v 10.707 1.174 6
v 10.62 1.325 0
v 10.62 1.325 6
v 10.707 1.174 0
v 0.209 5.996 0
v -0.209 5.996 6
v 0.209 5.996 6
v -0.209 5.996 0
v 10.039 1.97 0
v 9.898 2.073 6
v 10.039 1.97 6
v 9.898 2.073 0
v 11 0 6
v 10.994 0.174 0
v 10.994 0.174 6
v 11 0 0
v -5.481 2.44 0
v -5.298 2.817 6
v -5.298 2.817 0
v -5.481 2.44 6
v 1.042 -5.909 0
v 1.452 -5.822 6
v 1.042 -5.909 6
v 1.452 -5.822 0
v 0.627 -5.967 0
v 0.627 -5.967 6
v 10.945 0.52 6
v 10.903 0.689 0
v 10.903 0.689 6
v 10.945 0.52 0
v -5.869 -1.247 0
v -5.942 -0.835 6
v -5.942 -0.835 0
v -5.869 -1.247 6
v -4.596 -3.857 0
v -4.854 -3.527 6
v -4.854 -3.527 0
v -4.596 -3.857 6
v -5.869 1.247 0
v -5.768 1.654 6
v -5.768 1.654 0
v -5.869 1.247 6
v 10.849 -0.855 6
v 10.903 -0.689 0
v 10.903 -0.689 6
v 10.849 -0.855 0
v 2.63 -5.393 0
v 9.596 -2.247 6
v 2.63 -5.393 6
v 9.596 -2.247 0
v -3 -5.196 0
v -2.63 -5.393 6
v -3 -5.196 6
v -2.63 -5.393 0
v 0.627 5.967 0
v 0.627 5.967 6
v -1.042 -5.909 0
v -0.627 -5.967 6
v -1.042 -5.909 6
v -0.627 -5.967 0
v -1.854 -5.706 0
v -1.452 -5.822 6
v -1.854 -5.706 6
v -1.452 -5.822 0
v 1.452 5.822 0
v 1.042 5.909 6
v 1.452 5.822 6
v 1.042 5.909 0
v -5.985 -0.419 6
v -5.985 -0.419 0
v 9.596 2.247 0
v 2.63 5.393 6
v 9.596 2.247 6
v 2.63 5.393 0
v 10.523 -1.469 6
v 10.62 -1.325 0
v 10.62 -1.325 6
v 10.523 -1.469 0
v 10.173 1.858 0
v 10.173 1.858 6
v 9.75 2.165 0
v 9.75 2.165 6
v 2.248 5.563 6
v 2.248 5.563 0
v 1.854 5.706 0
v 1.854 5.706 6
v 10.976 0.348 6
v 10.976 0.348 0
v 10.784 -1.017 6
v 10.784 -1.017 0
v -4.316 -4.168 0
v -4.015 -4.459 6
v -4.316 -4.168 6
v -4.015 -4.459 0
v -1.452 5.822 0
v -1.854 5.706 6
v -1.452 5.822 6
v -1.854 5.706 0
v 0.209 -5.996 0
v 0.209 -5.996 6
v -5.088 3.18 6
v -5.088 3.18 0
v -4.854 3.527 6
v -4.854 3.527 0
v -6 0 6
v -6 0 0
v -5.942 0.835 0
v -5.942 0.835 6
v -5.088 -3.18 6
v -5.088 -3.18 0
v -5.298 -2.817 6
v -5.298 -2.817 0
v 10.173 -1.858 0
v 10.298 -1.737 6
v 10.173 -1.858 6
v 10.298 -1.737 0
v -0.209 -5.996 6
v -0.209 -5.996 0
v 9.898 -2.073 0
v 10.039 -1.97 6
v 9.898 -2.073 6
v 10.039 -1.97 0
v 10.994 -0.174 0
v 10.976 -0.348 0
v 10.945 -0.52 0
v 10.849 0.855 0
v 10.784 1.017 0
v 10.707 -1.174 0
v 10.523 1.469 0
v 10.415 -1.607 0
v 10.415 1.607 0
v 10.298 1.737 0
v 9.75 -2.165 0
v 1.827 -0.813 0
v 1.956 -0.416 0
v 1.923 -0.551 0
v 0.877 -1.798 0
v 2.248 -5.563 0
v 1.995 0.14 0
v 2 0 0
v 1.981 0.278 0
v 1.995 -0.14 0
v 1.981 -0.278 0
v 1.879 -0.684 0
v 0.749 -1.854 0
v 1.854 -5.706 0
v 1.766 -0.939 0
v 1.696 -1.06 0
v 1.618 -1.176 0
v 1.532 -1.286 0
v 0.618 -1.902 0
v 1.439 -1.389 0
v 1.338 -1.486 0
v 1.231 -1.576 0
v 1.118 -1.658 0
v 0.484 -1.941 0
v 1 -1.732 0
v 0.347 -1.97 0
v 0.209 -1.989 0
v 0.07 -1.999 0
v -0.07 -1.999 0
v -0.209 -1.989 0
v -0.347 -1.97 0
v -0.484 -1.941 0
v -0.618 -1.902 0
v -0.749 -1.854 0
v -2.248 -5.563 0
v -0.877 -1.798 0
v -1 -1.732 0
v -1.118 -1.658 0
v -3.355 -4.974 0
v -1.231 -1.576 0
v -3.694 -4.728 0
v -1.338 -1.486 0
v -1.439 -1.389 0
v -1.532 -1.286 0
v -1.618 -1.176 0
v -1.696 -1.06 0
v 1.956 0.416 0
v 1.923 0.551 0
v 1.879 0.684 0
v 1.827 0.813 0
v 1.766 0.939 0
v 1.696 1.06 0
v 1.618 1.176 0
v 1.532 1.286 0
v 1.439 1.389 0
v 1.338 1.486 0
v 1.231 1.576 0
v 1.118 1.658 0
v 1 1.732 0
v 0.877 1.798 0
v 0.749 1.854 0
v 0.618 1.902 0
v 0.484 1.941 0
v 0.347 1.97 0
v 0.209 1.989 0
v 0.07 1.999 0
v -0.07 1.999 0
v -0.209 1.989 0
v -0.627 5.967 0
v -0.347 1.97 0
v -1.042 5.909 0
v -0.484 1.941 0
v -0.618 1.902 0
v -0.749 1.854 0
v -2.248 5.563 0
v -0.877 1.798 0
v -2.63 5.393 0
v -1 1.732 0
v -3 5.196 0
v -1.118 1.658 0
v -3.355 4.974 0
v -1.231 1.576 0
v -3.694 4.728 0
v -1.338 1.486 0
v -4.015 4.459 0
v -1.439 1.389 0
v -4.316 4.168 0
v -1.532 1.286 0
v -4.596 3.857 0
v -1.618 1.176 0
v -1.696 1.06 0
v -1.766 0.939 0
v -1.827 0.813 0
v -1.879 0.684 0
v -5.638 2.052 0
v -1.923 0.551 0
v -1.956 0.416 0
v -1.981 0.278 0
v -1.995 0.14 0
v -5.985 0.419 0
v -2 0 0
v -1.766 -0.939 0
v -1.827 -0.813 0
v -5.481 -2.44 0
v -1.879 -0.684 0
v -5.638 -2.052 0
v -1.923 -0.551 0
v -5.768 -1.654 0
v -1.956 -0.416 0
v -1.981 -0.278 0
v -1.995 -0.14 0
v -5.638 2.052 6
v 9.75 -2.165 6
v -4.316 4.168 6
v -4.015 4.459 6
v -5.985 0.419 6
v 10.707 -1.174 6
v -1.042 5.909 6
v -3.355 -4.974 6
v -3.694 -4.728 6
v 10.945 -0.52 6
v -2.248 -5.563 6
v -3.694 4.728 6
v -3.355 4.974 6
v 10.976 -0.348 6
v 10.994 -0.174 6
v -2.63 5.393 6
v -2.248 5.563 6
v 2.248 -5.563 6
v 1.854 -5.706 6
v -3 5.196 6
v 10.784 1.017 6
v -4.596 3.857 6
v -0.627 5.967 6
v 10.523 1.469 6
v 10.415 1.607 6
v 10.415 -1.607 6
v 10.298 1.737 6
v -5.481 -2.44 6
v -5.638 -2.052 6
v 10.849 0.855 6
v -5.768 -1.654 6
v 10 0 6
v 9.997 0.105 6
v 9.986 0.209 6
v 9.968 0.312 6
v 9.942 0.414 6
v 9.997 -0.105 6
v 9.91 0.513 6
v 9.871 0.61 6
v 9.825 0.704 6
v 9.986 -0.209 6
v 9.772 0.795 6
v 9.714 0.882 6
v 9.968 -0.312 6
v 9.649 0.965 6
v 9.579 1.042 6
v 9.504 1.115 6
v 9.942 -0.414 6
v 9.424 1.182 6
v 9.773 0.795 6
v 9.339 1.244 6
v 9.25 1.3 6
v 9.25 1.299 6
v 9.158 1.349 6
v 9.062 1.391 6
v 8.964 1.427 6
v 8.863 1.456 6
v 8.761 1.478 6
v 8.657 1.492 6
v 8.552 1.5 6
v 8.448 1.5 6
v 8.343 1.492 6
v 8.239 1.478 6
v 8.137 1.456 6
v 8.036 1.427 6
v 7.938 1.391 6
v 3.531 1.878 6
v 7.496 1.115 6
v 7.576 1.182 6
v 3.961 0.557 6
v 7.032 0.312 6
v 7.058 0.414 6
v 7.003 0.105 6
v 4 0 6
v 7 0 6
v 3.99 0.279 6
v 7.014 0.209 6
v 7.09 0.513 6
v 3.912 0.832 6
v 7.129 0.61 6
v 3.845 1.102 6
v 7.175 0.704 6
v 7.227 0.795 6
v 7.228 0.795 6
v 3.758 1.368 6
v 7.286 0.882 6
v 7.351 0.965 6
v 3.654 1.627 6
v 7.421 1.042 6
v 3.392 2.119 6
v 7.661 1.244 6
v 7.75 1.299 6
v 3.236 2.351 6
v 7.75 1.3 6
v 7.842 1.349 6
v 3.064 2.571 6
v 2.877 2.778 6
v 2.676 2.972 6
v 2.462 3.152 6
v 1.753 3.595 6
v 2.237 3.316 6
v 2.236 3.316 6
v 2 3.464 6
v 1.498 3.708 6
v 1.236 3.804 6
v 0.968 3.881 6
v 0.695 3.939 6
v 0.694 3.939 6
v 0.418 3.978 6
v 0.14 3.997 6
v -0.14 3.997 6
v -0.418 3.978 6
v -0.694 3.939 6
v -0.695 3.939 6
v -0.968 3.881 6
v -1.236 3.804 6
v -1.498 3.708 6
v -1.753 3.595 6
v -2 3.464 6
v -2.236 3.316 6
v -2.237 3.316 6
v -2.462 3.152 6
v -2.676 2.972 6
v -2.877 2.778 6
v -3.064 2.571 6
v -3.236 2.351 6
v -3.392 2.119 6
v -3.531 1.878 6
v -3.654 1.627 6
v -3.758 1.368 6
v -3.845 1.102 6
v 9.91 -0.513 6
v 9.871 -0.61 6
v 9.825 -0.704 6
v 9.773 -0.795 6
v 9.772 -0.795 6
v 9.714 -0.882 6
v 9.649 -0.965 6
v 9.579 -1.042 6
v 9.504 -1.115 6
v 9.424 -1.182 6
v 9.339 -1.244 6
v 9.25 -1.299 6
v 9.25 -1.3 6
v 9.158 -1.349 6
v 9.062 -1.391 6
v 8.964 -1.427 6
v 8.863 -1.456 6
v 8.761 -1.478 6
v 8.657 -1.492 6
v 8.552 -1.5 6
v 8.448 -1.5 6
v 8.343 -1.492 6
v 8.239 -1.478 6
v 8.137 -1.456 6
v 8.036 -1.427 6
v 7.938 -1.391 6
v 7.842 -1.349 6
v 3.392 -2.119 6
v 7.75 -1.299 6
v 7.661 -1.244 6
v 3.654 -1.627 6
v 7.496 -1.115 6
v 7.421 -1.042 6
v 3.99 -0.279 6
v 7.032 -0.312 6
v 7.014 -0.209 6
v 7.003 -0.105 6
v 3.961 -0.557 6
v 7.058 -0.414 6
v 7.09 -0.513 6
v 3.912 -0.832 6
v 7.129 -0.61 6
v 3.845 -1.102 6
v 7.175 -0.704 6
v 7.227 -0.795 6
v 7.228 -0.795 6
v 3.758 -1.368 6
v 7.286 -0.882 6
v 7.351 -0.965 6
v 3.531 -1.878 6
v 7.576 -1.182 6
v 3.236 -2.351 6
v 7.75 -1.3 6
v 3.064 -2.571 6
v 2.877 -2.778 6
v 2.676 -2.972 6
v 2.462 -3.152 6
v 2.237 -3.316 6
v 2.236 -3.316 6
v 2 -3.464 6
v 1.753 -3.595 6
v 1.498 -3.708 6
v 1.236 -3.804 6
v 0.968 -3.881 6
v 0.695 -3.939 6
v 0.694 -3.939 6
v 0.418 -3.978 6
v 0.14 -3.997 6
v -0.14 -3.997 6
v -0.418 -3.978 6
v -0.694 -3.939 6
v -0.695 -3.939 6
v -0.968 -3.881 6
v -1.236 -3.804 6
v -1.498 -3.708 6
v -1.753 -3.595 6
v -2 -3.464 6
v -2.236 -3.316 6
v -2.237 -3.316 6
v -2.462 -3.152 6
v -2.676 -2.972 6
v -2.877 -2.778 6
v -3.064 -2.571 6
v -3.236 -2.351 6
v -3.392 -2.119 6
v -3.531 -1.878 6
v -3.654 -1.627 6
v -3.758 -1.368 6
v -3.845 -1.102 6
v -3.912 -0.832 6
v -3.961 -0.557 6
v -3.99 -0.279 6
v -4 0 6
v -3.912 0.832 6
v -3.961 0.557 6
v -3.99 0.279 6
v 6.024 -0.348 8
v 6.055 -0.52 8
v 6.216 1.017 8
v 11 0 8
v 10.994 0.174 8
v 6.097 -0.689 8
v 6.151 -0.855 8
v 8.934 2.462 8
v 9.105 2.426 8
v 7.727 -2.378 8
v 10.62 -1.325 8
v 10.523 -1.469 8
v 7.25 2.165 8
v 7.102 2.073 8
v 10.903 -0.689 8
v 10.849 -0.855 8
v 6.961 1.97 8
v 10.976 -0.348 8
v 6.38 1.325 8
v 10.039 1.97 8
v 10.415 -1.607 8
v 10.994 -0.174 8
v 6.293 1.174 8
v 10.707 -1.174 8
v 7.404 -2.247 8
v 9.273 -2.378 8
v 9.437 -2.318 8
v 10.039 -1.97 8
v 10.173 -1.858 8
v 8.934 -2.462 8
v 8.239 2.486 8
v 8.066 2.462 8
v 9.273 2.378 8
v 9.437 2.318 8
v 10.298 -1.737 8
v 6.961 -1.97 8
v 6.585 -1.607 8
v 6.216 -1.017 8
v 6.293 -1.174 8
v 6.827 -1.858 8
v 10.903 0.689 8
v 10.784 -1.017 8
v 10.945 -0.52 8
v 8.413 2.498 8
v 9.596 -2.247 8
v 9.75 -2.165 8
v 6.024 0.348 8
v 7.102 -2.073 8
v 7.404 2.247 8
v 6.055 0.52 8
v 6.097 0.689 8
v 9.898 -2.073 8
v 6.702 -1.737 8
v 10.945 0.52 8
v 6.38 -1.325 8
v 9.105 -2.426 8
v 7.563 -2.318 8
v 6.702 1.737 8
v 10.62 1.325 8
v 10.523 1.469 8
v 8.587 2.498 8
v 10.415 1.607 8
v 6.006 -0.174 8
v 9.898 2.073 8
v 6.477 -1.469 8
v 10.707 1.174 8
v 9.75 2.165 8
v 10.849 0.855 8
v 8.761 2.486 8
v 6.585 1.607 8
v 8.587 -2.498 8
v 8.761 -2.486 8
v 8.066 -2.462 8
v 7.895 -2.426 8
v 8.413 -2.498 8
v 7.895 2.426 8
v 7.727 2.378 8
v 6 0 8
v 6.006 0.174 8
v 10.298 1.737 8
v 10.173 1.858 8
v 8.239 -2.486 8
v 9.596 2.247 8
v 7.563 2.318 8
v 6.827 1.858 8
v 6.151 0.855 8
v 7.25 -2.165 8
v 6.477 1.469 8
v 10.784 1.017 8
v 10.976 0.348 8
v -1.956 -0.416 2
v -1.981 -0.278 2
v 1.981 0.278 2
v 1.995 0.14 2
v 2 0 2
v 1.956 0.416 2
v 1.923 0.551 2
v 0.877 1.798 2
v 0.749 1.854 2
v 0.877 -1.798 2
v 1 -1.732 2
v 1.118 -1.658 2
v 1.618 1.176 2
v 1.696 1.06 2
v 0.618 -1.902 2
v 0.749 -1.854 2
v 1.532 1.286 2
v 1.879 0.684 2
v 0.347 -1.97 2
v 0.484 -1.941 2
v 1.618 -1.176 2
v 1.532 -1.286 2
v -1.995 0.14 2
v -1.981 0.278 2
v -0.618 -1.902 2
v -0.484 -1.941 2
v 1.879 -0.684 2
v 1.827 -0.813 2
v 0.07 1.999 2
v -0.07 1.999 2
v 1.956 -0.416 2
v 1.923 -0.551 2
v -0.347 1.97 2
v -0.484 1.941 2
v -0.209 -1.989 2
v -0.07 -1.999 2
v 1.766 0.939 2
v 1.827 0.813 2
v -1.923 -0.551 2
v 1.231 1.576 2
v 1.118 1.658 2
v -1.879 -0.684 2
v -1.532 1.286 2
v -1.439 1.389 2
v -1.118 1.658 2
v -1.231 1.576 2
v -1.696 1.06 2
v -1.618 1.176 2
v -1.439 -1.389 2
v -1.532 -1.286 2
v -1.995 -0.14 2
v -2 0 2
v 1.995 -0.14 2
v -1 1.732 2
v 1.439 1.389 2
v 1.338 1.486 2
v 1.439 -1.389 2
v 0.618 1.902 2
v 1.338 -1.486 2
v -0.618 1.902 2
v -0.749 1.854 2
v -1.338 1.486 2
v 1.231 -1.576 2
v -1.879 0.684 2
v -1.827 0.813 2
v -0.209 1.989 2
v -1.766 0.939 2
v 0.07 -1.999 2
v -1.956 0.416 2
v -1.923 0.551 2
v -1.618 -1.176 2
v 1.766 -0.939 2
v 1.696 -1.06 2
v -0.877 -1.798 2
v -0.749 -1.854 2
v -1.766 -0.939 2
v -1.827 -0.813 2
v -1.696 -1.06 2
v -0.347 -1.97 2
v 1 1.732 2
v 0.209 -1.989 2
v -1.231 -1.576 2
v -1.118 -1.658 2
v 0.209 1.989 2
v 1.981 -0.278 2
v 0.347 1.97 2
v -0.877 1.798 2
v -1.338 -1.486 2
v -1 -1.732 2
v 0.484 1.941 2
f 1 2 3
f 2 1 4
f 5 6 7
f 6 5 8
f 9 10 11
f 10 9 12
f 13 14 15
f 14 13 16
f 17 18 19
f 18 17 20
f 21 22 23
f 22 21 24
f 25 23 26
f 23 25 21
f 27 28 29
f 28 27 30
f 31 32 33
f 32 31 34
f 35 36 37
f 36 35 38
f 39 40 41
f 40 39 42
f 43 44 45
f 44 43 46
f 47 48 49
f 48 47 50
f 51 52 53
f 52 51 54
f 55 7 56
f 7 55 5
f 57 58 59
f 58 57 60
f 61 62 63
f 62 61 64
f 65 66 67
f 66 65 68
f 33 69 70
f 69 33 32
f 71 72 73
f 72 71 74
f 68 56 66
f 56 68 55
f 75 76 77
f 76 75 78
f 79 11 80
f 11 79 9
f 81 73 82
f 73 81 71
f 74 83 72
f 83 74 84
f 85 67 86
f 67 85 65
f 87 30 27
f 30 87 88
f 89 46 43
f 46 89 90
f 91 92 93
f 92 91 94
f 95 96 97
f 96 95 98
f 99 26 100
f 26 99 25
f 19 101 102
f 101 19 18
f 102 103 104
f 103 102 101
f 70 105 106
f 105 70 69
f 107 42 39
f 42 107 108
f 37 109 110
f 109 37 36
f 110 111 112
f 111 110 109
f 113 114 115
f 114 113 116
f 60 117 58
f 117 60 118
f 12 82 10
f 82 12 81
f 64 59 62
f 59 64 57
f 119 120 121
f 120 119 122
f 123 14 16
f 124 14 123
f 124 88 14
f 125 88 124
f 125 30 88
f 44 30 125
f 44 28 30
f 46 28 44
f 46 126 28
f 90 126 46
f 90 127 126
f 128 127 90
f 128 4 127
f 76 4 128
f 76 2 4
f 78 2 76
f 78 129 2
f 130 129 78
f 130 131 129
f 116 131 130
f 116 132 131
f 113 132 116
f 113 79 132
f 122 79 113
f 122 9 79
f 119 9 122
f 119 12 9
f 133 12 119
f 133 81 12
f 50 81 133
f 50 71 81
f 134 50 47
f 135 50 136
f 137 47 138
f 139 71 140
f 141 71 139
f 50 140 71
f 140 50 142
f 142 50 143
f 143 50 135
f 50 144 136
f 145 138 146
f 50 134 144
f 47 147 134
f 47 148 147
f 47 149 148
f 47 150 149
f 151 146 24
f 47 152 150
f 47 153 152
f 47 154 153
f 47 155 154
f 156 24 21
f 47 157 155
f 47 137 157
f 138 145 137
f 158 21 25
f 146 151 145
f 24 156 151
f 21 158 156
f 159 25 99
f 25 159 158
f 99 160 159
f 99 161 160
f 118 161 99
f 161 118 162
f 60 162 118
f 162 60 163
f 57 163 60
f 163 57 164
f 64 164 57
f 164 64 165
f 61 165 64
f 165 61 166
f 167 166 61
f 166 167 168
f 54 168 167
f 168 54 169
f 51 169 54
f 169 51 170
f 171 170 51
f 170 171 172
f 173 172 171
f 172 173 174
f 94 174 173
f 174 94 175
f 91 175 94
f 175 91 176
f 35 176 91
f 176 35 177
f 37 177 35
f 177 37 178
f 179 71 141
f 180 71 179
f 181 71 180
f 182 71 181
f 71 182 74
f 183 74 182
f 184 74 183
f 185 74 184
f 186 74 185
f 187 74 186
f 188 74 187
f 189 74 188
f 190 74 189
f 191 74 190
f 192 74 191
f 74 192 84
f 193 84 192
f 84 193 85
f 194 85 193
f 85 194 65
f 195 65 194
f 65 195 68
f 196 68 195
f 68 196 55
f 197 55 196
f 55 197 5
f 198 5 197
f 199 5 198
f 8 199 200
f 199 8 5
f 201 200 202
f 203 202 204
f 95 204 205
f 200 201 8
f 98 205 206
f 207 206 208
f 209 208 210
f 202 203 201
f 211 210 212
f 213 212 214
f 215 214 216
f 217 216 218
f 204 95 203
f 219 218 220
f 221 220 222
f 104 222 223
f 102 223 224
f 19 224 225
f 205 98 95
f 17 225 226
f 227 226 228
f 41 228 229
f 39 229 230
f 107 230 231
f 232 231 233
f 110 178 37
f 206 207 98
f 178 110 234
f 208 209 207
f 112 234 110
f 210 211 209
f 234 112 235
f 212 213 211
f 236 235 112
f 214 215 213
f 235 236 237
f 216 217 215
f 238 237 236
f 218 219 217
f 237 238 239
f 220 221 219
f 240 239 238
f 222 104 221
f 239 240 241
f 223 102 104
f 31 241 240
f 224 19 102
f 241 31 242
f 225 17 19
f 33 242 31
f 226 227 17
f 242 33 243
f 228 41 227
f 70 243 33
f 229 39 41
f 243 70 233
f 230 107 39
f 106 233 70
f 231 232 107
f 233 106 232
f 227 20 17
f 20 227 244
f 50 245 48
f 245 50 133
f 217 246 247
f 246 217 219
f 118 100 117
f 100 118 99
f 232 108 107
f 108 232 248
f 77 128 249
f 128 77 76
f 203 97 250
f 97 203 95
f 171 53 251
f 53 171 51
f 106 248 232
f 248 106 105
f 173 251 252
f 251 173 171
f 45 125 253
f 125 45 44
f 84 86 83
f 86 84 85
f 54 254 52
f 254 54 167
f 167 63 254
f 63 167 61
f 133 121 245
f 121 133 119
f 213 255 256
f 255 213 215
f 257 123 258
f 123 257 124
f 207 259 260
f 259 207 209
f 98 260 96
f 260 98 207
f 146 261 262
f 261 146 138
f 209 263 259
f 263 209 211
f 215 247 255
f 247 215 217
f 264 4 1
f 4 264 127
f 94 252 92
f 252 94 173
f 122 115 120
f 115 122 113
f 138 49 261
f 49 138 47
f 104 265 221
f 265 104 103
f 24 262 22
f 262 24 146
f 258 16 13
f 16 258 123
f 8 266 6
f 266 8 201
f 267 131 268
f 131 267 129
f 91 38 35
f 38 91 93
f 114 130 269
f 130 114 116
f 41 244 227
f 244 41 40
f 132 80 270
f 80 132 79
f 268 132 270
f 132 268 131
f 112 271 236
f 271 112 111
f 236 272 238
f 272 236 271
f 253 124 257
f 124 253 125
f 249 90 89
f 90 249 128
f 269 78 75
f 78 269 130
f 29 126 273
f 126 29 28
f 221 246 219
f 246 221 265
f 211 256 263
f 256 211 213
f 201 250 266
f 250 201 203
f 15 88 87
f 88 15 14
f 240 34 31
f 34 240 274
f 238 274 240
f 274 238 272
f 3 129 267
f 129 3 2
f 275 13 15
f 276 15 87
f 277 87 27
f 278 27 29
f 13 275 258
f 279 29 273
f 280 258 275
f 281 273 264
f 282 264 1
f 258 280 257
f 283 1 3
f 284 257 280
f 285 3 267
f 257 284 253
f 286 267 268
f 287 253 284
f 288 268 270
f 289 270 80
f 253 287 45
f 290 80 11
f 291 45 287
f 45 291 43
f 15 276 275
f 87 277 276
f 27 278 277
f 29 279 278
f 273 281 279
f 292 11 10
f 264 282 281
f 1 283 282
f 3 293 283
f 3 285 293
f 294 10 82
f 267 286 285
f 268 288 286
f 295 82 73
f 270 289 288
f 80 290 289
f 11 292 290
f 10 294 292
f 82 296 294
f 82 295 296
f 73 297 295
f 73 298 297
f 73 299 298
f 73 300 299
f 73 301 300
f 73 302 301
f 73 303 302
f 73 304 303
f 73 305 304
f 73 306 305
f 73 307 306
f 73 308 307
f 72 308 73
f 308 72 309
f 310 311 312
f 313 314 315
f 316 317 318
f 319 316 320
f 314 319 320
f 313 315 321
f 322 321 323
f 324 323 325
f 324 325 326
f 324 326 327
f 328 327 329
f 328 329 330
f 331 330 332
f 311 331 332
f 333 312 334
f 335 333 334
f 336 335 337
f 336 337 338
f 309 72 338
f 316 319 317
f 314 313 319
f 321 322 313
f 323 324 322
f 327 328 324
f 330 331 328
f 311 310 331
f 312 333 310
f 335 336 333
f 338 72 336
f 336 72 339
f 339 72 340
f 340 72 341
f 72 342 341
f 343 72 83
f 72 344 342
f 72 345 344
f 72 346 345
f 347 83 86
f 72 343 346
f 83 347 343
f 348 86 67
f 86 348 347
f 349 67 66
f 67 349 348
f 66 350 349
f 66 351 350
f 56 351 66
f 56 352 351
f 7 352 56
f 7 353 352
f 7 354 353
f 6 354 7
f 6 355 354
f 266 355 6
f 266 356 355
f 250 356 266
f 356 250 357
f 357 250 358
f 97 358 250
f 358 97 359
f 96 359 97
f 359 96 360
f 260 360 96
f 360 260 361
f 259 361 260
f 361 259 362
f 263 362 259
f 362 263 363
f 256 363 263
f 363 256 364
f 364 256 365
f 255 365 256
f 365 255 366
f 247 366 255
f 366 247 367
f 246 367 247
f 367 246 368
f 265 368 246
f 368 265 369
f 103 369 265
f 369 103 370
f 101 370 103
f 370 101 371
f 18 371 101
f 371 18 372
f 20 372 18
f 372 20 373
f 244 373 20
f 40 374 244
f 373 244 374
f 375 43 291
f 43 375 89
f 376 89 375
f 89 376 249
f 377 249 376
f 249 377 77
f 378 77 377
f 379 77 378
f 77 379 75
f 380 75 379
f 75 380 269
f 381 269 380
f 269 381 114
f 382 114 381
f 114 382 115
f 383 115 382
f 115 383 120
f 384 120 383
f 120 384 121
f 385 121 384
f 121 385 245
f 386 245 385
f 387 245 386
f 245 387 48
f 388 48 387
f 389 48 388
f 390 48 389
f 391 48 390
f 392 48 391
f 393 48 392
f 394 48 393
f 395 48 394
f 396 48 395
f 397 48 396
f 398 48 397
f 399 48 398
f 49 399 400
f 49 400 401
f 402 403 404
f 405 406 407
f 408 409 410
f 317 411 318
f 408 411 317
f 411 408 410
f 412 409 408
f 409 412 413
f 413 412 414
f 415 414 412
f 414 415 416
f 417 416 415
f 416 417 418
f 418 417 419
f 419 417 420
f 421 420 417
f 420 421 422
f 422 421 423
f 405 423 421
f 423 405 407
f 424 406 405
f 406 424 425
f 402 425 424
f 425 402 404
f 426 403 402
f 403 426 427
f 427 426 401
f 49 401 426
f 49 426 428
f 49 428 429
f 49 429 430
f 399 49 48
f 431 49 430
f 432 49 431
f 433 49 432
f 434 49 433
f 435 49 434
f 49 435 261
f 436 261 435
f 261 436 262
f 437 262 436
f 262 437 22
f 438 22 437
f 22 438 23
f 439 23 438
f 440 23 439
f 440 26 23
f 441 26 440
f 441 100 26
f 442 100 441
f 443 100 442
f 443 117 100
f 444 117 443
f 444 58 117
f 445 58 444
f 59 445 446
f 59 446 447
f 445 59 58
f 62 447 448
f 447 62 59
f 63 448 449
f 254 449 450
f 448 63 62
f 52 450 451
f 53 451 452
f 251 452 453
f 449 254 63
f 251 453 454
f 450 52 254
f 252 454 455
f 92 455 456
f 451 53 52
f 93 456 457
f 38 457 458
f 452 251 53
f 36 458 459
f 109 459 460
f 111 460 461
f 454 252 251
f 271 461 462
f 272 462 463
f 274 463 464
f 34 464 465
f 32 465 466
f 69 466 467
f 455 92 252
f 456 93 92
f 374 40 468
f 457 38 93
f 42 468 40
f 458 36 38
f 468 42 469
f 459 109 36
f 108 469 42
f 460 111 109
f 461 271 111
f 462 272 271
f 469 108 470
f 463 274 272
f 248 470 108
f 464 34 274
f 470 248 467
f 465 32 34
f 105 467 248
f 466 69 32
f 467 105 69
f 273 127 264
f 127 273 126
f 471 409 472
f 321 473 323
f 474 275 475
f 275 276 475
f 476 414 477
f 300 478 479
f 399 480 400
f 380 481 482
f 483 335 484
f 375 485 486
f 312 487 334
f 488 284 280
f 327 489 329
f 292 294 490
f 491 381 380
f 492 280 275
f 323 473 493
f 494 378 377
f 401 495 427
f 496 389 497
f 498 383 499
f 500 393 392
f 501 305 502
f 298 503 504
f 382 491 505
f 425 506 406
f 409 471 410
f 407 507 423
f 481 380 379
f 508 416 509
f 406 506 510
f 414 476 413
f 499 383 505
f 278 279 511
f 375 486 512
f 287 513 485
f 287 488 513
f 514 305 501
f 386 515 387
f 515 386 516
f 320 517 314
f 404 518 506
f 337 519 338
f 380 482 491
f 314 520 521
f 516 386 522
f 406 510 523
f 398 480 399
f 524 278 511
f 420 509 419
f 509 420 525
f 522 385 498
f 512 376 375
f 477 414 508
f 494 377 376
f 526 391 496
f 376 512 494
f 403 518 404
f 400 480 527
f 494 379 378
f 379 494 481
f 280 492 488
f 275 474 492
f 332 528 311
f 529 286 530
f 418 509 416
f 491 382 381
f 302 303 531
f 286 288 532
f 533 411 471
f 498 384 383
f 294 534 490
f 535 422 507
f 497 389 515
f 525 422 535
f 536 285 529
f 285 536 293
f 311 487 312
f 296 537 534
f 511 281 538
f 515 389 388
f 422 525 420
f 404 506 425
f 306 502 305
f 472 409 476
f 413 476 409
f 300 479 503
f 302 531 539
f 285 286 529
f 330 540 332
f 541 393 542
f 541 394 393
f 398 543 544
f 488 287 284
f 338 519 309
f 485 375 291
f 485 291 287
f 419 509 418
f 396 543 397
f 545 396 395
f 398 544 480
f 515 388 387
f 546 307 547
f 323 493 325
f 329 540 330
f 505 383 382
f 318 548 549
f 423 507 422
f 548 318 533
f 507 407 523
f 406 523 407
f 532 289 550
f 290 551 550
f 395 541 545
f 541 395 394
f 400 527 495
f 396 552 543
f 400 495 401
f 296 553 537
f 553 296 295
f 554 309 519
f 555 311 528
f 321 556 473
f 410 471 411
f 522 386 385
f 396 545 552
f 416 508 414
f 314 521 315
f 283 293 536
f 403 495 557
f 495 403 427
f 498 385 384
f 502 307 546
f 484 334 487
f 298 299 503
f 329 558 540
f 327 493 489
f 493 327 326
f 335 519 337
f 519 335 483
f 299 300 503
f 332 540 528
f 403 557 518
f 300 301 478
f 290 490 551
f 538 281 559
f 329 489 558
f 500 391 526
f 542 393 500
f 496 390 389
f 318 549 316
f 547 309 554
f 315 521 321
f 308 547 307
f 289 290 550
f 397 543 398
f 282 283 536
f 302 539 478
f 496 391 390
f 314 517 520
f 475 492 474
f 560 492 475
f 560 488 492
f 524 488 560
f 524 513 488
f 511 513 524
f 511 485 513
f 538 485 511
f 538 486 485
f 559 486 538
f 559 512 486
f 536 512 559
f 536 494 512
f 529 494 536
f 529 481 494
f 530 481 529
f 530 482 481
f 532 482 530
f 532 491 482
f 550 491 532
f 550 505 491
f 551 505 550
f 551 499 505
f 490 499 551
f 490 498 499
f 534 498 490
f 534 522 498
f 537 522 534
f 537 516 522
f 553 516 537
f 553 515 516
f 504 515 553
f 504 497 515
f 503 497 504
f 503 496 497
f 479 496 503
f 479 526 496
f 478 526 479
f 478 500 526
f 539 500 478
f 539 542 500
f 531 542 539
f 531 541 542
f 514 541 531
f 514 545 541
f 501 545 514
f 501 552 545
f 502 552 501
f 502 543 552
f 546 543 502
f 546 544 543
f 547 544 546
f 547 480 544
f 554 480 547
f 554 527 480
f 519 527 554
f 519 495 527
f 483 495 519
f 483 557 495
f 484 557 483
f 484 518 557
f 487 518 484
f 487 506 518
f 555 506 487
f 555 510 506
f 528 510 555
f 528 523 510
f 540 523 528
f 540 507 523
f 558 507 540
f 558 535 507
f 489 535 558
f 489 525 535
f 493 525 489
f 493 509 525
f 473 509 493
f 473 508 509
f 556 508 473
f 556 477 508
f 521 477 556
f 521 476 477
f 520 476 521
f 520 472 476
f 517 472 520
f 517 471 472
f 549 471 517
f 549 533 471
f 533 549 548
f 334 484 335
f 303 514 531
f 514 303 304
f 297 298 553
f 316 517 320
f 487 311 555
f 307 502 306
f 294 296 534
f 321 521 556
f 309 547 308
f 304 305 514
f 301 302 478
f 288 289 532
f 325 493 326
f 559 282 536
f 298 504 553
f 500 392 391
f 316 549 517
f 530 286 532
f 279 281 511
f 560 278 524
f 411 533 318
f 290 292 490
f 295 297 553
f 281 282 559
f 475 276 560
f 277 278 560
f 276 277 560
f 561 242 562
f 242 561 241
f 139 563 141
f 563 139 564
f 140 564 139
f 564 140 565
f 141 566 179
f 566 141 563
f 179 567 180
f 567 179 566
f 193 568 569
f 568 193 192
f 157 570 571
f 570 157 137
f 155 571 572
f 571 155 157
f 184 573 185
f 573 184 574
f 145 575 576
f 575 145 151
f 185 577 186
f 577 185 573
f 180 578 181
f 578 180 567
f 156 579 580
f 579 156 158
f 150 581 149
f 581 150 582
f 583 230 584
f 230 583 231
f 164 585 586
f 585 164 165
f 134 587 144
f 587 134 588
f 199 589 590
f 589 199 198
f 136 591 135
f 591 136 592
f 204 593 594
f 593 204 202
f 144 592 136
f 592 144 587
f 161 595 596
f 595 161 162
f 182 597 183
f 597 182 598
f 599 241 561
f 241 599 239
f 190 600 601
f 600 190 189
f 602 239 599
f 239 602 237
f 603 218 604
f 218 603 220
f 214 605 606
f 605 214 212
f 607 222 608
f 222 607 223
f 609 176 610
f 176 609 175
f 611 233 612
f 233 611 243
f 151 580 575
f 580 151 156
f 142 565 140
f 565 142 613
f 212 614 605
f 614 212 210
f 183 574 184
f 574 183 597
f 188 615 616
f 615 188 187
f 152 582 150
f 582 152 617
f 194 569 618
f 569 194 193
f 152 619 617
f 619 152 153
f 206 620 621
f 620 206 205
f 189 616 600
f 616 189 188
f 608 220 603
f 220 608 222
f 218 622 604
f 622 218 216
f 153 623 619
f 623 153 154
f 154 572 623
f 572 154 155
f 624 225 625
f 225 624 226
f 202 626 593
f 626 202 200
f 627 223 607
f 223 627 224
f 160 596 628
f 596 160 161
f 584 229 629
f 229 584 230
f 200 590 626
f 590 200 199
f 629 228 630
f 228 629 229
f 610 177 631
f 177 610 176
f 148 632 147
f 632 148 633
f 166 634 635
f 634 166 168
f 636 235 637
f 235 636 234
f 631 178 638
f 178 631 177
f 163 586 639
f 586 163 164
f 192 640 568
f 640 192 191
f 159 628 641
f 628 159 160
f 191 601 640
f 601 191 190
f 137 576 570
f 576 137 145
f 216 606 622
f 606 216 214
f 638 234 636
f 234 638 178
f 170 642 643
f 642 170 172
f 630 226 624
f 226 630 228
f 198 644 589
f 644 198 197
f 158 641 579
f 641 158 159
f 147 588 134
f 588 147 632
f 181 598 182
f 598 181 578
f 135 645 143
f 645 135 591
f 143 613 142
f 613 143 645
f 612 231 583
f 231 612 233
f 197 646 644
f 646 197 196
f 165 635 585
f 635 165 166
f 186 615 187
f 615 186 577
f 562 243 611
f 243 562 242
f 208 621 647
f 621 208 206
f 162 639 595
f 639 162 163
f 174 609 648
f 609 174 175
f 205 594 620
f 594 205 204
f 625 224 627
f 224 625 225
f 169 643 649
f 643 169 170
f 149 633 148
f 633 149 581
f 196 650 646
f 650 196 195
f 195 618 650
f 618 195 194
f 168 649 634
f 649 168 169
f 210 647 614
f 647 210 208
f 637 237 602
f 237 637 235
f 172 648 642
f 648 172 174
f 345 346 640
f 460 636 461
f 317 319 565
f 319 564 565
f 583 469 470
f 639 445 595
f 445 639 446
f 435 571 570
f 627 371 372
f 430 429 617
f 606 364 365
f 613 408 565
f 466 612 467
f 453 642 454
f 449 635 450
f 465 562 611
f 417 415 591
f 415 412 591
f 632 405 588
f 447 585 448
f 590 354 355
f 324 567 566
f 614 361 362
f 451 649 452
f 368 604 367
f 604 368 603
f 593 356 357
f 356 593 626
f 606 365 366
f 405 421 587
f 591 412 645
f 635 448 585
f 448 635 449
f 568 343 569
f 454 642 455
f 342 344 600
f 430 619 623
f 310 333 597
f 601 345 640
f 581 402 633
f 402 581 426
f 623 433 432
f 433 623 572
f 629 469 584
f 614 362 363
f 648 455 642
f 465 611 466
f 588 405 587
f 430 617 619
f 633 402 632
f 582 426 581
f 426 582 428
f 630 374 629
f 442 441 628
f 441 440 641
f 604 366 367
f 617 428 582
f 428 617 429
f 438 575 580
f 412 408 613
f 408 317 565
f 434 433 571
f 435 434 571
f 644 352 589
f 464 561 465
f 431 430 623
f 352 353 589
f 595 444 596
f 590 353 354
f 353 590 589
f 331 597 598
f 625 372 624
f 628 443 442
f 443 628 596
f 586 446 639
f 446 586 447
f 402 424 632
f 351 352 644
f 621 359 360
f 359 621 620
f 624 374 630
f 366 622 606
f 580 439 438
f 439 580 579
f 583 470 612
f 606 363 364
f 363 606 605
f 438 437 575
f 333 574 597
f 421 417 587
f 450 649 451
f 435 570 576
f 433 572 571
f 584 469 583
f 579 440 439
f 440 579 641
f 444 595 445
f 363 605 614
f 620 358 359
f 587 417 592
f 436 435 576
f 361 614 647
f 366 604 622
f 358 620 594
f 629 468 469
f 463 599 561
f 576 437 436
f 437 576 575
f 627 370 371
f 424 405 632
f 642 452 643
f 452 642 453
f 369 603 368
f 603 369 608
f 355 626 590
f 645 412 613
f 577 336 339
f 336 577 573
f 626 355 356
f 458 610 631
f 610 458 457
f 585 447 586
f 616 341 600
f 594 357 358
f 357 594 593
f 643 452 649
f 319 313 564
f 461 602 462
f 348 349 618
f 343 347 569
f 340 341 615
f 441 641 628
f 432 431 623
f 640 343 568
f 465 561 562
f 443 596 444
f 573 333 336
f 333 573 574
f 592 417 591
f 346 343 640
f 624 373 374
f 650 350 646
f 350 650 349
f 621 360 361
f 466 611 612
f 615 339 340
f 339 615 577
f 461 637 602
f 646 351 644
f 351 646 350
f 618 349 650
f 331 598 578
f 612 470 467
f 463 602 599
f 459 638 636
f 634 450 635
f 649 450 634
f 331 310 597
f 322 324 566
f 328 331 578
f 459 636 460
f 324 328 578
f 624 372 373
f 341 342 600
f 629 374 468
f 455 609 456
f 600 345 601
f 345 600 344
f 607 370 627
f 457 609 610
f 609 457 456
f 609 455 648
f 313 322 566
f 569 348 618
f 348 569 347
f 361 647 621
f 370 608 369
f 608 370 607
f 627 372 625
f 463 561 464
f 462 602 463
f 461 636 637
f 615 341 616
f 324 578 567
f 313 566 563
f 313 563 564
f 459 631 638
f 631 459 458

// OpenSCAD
Wall=2;
Hole_diameter=4;
Keyhole_diameter=5;
Screw_head_diameter=8;
Screw_head_height=4;

/* [Advanced] */
Punch = 0.001;
$fn = 90;

module outer() {
    risen = Wall + Screw_head_height;
    pin_base = min(Keyhole_diameter - 2, Hole_diameter);
    screw_clearance_d = Screw_head_diameter/2 + Wall;

    hull() {
        cylinder(h=risen, d=Screw_head_diameter + Wall*2);
        
        translate([screw_clearance_d + Keyhole_diameter/2, 0, 0])
        cylinder(
            h=risen,
            d=Keyhole_diameter
        );
    }
    
    translate([
        screw_clearance_d + Keyhole_diameter/2,
        0,
        Wall + Screw_head_height - Punch
    ]) cylinder(
        h=Wall+Punch,
        d1=pin_base,
        d2=Keyhole_diameter
    );
}

module screw_negative() {

    // hole
    translate([0,0,-Punch]) cylinder(
        h=Punch + Wall + Screw_head_height + Punch,
        d=Hole_diameter
    );

    // countersink
    translate([0, 0, Wall]) cylinder(
        h=Screw_head_height + Punch,
        d1=Hole_diameter,
        d2=Screw_head_diameter
    );
}

module all() {
    difference() {
        outer();
        screw_negative();
    }
}

all();
